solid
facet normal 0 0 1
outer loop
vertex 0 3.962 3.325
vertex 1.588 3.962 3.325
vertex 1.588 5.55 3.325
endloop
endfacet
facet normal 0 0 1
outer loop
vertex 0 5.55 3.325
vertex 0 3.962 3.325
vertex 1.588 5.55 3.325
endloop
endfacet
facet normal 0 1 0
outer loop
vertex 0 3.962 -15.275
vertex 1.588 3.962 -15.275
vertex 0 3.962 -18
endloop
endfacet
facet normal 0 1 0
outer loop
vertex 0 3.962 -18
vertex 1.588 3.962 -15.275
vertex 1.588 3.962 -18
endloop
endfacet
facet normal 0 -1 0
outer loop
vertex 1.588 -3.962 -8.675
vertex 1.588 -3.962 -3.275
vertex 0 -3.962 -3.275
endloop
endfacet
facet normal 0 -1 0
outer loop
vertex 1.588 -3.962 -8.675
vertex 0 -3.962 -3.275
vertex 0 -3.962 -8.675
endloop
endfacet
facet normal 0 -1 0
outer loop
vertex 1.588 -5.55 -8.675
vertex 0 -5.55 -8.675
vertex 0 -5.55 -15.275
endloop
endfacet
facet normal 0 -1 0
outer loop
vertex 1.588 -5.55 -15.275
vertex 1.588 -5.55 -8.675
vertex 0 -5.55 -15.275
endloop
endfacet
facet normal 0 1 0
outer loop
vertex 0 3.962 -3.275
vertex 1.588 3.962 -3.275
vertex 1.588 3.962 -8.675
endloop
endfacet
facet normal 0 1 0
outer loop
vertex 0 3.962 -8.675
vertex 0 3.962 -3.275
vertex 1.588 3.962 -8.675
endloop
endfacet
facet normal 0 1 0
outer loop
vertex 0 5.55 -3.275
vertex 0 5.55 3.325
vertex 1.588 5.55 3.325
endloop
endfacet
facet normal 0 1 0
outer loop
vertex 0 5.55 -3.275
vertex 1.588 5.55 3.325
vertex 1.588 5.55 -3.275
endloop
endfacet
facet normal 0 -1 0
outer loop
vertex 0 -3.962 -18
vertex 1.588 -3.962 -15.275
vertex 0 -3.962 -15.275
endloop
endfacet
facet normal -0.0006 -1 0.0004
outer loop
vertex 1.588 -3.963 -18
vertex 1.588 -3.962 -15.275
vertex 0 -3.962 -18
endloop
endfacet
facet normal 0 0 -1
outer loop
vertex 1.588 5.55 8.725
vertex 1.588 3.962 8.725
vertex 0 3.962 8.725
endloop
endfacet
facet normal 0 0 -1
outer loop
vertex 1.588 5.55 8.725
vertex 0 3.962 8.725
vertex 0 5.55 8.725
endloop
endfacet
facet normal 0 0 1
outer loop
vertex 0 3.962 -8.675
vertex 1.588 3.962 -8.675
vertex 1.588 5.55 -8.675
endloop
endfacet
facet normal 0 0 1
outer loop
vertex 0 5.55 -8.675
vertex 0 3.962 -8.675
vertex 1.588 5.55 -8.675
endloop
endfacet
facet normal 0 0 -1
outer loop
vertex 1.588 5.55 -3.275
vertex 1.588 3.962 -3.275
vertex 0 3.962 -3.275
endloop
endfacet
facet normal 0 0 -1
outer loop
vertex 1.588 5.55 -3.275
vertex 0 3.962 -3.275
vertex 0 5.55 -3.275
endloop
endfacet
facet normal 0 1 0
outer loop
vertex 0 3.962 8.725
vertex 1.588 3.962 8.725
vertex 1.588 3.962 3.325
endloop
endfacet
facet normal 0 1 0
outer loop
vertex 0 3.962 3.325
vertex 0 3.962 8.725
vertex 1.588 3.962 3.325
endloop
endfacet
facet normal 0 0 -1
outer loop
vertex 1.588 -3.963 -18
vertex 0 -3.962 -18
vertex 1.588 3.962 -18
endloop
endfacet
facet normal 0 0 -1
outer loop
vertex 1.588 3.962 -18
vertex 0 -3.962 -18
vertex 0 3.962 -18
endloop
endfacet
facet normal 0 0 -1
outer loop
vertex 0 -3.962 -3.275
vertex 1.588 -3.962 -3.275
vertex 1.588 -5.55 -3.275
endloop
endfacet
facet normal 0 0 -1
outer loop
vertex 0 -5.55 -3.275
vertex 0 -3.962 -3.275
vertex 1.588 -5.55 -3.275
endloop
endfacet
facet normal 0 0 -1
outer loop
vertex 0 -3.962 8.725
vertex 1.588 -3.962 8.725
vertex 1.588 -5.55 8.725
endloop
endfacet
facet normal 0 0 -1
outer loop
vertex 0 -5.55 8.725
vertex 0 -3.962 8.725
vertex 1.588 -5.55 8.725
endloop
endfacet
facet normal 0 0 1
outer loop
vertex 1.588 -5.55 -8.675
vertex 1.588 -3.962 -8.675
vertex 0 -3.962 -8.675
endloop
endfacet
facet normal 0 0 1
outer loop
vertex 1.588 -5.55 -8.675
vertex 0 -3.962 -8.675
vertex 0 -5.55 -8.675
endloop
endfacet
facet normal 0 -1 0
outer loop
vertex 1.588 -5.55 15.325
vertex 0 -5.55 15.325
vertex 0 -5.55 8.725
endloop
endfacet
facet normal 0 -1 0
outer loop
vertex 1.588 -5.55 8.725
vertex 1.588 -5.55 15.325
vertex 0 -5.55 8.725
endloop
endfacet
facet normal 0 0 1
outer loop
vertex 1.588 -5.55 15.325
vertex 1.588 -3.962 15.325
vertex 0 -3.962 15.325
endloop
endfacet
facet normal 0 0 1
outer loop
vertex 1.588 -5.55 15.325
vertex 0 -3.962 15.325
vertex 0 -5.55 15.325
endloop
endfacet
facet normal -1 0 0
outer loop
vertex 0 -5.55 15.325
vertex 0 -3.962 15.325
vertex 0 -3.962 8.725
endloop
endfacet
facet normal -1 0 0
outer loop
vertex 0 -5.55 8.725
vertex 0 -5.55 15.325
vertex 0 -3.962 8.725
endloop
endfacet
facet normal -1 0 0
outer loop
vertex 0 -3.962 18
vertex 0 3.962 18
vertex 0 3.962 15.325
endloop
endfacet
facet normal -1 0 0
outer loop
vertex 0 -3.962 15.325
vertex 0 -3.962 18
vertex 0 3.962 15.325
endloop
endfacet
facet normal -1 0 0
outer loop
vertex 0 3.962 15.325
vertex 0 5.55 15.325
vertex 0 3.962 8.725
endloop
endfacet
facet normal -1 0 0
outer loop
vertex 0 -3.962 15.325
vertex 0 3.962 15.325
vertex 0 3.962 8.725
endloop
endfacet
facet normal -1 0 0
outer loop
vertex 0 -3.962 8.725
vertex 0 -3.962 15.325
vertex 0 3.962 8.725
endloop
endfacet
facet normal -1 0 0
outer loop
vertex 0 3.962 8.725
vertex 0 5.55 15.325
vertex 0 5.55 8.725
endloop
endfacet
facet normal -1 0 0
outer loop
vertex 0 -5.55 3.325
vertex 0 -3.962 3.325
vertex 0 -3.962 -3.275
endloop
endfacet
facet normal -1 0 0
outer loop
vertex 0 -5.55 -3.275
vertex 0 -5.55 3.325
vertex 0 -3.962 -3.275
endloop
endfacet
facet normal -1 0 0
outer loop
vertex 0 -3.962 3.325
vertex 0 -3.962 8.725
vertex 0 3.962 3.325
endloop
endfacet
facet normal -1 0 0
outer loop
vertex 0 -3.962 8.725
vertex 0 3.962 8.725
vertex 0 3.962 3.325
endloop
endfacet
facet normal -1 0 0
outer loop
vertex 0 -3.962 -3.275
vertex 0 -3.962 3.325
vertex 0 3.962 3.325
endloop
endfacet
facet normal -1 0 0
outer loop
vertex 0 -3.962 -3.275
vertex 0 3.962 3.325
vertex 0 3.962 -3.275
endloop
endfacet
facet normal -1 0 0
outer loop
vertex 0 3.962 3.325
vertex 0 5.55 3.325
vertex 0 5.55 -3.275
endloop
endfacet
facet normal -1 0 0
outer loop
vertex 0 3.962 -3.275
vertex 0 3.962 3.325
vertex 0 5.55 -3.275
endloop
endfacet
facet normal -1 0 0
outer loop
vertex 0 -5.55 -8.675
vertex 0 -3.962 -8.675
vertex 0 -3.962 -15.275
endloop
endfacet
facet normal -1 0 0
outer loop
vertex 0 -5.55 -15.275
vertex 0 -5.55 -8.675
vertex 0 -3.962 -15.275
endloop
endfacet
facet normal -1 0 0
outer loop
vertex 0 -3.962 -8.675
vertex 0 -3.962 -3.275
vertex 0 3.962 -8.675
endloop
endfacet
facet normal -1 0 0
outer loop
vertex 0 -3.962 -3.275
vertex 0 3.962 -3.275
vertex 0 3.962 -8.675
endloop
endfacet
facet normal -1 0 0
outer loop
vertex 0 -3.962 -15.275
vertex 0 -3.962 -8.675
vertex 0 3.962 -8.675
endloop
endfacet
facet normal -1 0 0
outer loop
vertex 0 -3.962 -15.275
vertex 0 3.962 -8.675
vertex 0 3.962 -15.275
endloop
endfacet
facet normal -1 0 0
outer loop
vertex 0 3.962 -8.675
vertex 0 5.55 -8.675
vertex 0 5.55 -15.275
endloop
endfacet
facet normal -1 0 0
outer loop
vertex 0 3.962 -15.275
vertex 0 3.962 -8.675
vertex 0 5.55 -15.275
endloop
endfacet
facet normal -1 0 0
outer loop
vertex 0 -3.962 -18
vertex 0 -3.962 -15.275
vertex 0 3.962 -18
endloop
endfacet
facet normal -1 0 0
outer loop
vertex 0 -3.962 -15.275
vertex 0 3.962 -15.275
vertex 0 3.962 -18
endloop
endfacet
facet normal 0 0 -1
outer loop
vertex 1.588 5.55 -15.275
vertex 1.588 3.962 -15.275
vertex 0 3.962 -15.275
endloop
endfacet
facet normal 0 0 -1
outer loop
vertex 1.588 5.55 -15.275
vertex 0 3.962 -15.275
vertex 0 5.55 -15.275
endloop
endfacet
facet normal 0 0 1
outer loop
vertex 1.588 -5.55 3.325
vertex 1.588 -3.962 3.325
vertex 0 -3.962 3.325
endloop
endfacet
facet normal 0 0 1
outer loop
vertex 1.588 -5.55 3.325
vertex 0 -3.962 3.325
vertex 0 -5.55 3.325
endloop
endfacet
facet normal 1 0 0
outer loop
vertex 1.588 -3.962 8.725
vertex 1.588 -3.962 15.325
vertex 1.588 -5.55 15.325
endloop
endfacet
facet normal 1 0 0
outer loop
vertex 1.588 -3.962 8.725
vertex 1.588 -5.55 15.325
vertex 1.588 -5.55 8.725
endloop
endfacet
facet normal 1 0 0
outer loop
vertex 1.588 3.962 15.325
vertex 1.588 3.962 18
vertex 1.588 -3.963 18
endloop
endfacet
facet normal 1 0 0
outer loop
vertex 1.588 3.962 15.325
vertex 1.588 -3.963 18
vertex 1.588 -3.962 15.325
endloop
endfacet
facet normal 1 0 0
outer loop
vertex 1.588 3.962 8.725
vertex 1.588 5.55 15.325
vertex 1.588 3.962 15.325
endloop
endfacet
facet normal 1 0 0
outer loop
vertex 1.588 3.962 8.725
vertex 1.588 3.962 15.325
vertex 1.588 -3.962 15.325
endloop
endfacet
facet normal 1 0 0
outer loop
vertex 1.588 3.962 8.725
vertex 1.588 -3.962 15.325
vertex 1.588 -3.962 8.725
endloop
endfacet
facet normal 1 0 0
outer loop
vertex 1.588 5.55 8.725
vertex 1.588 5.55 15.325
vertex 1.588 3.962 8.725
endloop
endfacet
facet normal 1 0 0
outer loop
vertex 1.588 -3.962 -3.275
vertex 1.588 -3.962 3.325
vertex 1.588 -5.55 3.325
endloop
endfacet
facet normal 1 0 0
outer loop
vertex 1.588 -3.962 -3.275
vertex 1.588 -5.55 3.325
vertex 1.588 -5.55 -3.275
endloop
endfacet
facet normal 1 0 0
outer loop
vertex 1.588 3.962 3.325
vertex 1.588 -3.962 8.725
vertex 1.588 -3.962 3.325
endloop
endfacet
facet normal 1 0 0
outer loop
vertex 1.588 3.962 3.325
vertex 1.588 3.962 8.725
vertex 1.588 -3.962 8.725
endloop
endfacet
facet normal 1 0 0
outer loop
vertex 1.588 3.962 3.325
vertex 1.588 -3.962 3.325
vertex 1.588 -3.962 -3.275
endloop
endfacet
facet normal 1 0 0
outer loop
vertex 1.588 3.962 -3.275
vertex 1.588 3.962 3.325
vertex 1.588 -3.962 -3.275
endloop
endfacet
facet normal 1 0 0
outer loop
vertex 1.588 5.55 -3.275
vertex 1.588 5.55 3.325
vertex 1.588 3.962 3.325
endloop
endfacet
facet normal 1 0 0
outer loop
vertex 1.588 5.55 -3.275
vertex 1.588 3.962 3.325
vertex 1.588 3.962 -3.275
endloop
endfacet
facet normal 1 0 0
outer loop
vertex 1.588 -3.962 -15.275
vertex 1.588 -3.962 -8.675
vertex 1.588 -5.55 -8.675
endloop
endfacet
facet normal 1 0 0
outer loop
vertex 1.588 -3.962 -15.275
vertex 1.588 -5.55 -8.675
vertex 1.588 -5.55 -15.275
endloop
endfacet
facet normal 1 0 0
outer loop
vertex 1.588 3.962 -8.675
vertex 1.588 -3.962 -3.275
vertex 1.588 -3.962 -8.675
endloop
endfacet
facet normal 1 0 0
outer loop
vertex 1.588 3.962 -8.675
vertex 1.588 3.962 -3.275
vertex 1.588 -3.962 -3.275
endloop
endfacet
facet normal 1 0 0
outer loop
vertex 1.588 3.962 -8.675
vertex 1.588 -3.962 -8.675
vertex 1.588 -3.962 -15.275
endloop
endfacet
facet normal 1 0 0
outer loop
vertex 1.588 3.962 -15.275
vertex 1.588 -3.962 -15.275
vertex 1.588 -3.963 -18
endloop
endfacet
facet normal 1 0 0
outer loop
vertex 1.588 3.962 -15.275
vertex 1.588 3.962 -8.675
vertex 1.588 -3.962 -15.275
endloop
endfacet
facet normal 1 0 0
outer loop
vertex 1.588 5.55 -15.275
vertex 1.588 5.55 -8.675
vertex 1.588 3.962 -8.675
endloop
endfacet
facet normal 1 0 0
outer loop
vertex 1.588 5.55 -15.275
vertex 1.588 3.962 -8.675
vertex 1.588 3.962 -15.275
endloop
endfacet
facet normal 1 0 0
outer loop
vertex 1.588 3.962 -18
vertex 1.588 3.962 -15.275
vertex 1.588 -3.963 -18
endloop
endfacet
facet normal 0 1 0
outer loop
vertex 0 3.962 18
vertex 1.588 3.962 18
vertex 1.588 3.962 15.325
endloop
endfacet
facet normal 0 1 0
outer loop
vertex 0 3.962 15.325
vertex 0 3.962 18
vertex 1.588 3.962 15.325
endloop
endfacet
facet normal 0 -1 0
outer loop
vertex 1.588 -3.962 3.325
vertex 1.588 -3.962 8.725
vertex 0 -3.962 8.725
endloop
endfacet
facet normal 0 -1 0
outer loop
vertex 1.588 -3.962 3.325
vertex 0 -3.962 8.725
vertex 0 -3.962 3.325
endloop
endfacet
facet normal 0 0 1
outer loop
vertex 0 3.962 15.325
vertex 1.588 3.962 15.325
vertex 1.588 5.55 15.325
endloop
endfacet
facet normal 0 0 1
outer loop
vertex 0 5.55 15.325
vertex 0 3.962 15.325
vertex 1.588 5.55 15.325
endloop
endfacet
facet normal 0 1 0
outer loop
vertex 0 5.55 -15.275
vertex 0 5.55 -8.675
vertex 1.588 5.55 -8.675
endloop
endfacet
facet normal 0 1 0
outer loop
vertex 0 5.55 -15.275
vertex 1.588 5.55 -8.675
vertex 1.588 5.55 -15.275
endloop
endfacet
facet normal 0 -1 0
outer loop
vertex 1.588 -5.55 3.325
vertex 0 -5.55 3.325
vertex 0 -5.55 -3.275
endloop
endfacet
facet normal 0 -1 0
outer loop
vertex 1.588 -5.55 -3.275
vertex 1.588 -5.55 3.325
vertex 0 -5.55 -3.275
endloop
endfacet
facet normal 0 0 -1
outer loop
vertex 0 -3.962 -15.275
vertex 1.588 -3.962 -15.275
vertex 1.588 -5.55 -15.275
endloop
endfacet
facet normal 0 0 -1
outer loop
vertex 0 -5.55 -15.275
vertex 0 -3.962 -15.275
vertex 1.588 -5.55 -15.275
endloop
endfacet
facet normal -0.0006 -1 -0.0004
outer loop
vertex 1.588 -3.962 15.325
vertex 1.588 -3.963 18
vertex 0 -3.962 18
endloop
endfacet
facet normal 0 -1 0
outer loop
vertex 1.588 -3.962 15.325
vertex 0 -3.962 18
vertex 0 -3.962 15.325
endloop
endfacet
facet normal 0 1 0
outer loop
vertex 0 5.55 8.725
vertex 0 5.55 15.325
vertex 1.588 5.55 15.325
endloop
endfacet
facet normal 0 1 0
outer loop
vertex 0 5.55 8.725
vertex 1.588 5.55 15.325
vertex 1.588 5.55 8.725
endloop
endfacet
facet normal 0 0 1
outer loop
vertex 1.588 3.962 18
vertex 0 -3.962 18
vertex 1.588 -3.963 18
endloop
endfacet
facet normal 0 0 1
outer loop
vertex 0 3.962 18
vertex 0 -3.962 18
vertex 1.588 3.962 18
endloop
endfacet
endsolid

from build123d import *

# Parameters (mm, degrees)
SKETCH1_W           = 36
SKETCH1_H           = 11.1
BOSS_EXTRUDE1_DEPTH = 1.5875
SKETCH2_W           = 5.4
SKETCH2_H           = 1.5875
CUT_EXTRUDE1_DEPTH  = 19.902980089


with BuildPart() as part:
    # Sketch1 → Boss-Extrude1 (new body)
    with BuildSketch(Plane(origin=(0, 0, 0), x_dir=(0, 0, -1), z_dir=(1, 0, 0))):
        Rectangle(SKETCH1_W, SKETCH1_H)
    extrude(amount=BOSS_EXTRUDE1_DEPTH)

    # Sketch2 → Cut-Extrude1 (cut, through all)
    with BuildSketch(Plane(origin=(1.5875, 0, 0), x_dir=(0, 0, -1), z_dir=(1, 0, 0))):
        with Locations((5.975, 4.75625)):
            Rectangle(SKETCH2_W, SKETCH2_H)
        with Locations((17.975, 4.75625)):
            Rectangle(SKETCH2_W, SKETCH2_H)
        with Locations((-6.025, 4.75625)):
            Rectangle(SKETCH2_W, SKETCH2_H)
        with Locations((-18.025, 4.75625)):
            Rectangle(SKETCH2_W, SKETCH2_H)
    cut_extrude1 = extrude(amount=-CUT_EXTRUDE1_DEPTH, mode=Mode.SUBTRACT)

    # Mirror1: Cut-Extrude1 across plane
    add(cut_extrude1.mirror(Plane.ZX), mode=Mode.SUBTRACT)


solid = part.part
